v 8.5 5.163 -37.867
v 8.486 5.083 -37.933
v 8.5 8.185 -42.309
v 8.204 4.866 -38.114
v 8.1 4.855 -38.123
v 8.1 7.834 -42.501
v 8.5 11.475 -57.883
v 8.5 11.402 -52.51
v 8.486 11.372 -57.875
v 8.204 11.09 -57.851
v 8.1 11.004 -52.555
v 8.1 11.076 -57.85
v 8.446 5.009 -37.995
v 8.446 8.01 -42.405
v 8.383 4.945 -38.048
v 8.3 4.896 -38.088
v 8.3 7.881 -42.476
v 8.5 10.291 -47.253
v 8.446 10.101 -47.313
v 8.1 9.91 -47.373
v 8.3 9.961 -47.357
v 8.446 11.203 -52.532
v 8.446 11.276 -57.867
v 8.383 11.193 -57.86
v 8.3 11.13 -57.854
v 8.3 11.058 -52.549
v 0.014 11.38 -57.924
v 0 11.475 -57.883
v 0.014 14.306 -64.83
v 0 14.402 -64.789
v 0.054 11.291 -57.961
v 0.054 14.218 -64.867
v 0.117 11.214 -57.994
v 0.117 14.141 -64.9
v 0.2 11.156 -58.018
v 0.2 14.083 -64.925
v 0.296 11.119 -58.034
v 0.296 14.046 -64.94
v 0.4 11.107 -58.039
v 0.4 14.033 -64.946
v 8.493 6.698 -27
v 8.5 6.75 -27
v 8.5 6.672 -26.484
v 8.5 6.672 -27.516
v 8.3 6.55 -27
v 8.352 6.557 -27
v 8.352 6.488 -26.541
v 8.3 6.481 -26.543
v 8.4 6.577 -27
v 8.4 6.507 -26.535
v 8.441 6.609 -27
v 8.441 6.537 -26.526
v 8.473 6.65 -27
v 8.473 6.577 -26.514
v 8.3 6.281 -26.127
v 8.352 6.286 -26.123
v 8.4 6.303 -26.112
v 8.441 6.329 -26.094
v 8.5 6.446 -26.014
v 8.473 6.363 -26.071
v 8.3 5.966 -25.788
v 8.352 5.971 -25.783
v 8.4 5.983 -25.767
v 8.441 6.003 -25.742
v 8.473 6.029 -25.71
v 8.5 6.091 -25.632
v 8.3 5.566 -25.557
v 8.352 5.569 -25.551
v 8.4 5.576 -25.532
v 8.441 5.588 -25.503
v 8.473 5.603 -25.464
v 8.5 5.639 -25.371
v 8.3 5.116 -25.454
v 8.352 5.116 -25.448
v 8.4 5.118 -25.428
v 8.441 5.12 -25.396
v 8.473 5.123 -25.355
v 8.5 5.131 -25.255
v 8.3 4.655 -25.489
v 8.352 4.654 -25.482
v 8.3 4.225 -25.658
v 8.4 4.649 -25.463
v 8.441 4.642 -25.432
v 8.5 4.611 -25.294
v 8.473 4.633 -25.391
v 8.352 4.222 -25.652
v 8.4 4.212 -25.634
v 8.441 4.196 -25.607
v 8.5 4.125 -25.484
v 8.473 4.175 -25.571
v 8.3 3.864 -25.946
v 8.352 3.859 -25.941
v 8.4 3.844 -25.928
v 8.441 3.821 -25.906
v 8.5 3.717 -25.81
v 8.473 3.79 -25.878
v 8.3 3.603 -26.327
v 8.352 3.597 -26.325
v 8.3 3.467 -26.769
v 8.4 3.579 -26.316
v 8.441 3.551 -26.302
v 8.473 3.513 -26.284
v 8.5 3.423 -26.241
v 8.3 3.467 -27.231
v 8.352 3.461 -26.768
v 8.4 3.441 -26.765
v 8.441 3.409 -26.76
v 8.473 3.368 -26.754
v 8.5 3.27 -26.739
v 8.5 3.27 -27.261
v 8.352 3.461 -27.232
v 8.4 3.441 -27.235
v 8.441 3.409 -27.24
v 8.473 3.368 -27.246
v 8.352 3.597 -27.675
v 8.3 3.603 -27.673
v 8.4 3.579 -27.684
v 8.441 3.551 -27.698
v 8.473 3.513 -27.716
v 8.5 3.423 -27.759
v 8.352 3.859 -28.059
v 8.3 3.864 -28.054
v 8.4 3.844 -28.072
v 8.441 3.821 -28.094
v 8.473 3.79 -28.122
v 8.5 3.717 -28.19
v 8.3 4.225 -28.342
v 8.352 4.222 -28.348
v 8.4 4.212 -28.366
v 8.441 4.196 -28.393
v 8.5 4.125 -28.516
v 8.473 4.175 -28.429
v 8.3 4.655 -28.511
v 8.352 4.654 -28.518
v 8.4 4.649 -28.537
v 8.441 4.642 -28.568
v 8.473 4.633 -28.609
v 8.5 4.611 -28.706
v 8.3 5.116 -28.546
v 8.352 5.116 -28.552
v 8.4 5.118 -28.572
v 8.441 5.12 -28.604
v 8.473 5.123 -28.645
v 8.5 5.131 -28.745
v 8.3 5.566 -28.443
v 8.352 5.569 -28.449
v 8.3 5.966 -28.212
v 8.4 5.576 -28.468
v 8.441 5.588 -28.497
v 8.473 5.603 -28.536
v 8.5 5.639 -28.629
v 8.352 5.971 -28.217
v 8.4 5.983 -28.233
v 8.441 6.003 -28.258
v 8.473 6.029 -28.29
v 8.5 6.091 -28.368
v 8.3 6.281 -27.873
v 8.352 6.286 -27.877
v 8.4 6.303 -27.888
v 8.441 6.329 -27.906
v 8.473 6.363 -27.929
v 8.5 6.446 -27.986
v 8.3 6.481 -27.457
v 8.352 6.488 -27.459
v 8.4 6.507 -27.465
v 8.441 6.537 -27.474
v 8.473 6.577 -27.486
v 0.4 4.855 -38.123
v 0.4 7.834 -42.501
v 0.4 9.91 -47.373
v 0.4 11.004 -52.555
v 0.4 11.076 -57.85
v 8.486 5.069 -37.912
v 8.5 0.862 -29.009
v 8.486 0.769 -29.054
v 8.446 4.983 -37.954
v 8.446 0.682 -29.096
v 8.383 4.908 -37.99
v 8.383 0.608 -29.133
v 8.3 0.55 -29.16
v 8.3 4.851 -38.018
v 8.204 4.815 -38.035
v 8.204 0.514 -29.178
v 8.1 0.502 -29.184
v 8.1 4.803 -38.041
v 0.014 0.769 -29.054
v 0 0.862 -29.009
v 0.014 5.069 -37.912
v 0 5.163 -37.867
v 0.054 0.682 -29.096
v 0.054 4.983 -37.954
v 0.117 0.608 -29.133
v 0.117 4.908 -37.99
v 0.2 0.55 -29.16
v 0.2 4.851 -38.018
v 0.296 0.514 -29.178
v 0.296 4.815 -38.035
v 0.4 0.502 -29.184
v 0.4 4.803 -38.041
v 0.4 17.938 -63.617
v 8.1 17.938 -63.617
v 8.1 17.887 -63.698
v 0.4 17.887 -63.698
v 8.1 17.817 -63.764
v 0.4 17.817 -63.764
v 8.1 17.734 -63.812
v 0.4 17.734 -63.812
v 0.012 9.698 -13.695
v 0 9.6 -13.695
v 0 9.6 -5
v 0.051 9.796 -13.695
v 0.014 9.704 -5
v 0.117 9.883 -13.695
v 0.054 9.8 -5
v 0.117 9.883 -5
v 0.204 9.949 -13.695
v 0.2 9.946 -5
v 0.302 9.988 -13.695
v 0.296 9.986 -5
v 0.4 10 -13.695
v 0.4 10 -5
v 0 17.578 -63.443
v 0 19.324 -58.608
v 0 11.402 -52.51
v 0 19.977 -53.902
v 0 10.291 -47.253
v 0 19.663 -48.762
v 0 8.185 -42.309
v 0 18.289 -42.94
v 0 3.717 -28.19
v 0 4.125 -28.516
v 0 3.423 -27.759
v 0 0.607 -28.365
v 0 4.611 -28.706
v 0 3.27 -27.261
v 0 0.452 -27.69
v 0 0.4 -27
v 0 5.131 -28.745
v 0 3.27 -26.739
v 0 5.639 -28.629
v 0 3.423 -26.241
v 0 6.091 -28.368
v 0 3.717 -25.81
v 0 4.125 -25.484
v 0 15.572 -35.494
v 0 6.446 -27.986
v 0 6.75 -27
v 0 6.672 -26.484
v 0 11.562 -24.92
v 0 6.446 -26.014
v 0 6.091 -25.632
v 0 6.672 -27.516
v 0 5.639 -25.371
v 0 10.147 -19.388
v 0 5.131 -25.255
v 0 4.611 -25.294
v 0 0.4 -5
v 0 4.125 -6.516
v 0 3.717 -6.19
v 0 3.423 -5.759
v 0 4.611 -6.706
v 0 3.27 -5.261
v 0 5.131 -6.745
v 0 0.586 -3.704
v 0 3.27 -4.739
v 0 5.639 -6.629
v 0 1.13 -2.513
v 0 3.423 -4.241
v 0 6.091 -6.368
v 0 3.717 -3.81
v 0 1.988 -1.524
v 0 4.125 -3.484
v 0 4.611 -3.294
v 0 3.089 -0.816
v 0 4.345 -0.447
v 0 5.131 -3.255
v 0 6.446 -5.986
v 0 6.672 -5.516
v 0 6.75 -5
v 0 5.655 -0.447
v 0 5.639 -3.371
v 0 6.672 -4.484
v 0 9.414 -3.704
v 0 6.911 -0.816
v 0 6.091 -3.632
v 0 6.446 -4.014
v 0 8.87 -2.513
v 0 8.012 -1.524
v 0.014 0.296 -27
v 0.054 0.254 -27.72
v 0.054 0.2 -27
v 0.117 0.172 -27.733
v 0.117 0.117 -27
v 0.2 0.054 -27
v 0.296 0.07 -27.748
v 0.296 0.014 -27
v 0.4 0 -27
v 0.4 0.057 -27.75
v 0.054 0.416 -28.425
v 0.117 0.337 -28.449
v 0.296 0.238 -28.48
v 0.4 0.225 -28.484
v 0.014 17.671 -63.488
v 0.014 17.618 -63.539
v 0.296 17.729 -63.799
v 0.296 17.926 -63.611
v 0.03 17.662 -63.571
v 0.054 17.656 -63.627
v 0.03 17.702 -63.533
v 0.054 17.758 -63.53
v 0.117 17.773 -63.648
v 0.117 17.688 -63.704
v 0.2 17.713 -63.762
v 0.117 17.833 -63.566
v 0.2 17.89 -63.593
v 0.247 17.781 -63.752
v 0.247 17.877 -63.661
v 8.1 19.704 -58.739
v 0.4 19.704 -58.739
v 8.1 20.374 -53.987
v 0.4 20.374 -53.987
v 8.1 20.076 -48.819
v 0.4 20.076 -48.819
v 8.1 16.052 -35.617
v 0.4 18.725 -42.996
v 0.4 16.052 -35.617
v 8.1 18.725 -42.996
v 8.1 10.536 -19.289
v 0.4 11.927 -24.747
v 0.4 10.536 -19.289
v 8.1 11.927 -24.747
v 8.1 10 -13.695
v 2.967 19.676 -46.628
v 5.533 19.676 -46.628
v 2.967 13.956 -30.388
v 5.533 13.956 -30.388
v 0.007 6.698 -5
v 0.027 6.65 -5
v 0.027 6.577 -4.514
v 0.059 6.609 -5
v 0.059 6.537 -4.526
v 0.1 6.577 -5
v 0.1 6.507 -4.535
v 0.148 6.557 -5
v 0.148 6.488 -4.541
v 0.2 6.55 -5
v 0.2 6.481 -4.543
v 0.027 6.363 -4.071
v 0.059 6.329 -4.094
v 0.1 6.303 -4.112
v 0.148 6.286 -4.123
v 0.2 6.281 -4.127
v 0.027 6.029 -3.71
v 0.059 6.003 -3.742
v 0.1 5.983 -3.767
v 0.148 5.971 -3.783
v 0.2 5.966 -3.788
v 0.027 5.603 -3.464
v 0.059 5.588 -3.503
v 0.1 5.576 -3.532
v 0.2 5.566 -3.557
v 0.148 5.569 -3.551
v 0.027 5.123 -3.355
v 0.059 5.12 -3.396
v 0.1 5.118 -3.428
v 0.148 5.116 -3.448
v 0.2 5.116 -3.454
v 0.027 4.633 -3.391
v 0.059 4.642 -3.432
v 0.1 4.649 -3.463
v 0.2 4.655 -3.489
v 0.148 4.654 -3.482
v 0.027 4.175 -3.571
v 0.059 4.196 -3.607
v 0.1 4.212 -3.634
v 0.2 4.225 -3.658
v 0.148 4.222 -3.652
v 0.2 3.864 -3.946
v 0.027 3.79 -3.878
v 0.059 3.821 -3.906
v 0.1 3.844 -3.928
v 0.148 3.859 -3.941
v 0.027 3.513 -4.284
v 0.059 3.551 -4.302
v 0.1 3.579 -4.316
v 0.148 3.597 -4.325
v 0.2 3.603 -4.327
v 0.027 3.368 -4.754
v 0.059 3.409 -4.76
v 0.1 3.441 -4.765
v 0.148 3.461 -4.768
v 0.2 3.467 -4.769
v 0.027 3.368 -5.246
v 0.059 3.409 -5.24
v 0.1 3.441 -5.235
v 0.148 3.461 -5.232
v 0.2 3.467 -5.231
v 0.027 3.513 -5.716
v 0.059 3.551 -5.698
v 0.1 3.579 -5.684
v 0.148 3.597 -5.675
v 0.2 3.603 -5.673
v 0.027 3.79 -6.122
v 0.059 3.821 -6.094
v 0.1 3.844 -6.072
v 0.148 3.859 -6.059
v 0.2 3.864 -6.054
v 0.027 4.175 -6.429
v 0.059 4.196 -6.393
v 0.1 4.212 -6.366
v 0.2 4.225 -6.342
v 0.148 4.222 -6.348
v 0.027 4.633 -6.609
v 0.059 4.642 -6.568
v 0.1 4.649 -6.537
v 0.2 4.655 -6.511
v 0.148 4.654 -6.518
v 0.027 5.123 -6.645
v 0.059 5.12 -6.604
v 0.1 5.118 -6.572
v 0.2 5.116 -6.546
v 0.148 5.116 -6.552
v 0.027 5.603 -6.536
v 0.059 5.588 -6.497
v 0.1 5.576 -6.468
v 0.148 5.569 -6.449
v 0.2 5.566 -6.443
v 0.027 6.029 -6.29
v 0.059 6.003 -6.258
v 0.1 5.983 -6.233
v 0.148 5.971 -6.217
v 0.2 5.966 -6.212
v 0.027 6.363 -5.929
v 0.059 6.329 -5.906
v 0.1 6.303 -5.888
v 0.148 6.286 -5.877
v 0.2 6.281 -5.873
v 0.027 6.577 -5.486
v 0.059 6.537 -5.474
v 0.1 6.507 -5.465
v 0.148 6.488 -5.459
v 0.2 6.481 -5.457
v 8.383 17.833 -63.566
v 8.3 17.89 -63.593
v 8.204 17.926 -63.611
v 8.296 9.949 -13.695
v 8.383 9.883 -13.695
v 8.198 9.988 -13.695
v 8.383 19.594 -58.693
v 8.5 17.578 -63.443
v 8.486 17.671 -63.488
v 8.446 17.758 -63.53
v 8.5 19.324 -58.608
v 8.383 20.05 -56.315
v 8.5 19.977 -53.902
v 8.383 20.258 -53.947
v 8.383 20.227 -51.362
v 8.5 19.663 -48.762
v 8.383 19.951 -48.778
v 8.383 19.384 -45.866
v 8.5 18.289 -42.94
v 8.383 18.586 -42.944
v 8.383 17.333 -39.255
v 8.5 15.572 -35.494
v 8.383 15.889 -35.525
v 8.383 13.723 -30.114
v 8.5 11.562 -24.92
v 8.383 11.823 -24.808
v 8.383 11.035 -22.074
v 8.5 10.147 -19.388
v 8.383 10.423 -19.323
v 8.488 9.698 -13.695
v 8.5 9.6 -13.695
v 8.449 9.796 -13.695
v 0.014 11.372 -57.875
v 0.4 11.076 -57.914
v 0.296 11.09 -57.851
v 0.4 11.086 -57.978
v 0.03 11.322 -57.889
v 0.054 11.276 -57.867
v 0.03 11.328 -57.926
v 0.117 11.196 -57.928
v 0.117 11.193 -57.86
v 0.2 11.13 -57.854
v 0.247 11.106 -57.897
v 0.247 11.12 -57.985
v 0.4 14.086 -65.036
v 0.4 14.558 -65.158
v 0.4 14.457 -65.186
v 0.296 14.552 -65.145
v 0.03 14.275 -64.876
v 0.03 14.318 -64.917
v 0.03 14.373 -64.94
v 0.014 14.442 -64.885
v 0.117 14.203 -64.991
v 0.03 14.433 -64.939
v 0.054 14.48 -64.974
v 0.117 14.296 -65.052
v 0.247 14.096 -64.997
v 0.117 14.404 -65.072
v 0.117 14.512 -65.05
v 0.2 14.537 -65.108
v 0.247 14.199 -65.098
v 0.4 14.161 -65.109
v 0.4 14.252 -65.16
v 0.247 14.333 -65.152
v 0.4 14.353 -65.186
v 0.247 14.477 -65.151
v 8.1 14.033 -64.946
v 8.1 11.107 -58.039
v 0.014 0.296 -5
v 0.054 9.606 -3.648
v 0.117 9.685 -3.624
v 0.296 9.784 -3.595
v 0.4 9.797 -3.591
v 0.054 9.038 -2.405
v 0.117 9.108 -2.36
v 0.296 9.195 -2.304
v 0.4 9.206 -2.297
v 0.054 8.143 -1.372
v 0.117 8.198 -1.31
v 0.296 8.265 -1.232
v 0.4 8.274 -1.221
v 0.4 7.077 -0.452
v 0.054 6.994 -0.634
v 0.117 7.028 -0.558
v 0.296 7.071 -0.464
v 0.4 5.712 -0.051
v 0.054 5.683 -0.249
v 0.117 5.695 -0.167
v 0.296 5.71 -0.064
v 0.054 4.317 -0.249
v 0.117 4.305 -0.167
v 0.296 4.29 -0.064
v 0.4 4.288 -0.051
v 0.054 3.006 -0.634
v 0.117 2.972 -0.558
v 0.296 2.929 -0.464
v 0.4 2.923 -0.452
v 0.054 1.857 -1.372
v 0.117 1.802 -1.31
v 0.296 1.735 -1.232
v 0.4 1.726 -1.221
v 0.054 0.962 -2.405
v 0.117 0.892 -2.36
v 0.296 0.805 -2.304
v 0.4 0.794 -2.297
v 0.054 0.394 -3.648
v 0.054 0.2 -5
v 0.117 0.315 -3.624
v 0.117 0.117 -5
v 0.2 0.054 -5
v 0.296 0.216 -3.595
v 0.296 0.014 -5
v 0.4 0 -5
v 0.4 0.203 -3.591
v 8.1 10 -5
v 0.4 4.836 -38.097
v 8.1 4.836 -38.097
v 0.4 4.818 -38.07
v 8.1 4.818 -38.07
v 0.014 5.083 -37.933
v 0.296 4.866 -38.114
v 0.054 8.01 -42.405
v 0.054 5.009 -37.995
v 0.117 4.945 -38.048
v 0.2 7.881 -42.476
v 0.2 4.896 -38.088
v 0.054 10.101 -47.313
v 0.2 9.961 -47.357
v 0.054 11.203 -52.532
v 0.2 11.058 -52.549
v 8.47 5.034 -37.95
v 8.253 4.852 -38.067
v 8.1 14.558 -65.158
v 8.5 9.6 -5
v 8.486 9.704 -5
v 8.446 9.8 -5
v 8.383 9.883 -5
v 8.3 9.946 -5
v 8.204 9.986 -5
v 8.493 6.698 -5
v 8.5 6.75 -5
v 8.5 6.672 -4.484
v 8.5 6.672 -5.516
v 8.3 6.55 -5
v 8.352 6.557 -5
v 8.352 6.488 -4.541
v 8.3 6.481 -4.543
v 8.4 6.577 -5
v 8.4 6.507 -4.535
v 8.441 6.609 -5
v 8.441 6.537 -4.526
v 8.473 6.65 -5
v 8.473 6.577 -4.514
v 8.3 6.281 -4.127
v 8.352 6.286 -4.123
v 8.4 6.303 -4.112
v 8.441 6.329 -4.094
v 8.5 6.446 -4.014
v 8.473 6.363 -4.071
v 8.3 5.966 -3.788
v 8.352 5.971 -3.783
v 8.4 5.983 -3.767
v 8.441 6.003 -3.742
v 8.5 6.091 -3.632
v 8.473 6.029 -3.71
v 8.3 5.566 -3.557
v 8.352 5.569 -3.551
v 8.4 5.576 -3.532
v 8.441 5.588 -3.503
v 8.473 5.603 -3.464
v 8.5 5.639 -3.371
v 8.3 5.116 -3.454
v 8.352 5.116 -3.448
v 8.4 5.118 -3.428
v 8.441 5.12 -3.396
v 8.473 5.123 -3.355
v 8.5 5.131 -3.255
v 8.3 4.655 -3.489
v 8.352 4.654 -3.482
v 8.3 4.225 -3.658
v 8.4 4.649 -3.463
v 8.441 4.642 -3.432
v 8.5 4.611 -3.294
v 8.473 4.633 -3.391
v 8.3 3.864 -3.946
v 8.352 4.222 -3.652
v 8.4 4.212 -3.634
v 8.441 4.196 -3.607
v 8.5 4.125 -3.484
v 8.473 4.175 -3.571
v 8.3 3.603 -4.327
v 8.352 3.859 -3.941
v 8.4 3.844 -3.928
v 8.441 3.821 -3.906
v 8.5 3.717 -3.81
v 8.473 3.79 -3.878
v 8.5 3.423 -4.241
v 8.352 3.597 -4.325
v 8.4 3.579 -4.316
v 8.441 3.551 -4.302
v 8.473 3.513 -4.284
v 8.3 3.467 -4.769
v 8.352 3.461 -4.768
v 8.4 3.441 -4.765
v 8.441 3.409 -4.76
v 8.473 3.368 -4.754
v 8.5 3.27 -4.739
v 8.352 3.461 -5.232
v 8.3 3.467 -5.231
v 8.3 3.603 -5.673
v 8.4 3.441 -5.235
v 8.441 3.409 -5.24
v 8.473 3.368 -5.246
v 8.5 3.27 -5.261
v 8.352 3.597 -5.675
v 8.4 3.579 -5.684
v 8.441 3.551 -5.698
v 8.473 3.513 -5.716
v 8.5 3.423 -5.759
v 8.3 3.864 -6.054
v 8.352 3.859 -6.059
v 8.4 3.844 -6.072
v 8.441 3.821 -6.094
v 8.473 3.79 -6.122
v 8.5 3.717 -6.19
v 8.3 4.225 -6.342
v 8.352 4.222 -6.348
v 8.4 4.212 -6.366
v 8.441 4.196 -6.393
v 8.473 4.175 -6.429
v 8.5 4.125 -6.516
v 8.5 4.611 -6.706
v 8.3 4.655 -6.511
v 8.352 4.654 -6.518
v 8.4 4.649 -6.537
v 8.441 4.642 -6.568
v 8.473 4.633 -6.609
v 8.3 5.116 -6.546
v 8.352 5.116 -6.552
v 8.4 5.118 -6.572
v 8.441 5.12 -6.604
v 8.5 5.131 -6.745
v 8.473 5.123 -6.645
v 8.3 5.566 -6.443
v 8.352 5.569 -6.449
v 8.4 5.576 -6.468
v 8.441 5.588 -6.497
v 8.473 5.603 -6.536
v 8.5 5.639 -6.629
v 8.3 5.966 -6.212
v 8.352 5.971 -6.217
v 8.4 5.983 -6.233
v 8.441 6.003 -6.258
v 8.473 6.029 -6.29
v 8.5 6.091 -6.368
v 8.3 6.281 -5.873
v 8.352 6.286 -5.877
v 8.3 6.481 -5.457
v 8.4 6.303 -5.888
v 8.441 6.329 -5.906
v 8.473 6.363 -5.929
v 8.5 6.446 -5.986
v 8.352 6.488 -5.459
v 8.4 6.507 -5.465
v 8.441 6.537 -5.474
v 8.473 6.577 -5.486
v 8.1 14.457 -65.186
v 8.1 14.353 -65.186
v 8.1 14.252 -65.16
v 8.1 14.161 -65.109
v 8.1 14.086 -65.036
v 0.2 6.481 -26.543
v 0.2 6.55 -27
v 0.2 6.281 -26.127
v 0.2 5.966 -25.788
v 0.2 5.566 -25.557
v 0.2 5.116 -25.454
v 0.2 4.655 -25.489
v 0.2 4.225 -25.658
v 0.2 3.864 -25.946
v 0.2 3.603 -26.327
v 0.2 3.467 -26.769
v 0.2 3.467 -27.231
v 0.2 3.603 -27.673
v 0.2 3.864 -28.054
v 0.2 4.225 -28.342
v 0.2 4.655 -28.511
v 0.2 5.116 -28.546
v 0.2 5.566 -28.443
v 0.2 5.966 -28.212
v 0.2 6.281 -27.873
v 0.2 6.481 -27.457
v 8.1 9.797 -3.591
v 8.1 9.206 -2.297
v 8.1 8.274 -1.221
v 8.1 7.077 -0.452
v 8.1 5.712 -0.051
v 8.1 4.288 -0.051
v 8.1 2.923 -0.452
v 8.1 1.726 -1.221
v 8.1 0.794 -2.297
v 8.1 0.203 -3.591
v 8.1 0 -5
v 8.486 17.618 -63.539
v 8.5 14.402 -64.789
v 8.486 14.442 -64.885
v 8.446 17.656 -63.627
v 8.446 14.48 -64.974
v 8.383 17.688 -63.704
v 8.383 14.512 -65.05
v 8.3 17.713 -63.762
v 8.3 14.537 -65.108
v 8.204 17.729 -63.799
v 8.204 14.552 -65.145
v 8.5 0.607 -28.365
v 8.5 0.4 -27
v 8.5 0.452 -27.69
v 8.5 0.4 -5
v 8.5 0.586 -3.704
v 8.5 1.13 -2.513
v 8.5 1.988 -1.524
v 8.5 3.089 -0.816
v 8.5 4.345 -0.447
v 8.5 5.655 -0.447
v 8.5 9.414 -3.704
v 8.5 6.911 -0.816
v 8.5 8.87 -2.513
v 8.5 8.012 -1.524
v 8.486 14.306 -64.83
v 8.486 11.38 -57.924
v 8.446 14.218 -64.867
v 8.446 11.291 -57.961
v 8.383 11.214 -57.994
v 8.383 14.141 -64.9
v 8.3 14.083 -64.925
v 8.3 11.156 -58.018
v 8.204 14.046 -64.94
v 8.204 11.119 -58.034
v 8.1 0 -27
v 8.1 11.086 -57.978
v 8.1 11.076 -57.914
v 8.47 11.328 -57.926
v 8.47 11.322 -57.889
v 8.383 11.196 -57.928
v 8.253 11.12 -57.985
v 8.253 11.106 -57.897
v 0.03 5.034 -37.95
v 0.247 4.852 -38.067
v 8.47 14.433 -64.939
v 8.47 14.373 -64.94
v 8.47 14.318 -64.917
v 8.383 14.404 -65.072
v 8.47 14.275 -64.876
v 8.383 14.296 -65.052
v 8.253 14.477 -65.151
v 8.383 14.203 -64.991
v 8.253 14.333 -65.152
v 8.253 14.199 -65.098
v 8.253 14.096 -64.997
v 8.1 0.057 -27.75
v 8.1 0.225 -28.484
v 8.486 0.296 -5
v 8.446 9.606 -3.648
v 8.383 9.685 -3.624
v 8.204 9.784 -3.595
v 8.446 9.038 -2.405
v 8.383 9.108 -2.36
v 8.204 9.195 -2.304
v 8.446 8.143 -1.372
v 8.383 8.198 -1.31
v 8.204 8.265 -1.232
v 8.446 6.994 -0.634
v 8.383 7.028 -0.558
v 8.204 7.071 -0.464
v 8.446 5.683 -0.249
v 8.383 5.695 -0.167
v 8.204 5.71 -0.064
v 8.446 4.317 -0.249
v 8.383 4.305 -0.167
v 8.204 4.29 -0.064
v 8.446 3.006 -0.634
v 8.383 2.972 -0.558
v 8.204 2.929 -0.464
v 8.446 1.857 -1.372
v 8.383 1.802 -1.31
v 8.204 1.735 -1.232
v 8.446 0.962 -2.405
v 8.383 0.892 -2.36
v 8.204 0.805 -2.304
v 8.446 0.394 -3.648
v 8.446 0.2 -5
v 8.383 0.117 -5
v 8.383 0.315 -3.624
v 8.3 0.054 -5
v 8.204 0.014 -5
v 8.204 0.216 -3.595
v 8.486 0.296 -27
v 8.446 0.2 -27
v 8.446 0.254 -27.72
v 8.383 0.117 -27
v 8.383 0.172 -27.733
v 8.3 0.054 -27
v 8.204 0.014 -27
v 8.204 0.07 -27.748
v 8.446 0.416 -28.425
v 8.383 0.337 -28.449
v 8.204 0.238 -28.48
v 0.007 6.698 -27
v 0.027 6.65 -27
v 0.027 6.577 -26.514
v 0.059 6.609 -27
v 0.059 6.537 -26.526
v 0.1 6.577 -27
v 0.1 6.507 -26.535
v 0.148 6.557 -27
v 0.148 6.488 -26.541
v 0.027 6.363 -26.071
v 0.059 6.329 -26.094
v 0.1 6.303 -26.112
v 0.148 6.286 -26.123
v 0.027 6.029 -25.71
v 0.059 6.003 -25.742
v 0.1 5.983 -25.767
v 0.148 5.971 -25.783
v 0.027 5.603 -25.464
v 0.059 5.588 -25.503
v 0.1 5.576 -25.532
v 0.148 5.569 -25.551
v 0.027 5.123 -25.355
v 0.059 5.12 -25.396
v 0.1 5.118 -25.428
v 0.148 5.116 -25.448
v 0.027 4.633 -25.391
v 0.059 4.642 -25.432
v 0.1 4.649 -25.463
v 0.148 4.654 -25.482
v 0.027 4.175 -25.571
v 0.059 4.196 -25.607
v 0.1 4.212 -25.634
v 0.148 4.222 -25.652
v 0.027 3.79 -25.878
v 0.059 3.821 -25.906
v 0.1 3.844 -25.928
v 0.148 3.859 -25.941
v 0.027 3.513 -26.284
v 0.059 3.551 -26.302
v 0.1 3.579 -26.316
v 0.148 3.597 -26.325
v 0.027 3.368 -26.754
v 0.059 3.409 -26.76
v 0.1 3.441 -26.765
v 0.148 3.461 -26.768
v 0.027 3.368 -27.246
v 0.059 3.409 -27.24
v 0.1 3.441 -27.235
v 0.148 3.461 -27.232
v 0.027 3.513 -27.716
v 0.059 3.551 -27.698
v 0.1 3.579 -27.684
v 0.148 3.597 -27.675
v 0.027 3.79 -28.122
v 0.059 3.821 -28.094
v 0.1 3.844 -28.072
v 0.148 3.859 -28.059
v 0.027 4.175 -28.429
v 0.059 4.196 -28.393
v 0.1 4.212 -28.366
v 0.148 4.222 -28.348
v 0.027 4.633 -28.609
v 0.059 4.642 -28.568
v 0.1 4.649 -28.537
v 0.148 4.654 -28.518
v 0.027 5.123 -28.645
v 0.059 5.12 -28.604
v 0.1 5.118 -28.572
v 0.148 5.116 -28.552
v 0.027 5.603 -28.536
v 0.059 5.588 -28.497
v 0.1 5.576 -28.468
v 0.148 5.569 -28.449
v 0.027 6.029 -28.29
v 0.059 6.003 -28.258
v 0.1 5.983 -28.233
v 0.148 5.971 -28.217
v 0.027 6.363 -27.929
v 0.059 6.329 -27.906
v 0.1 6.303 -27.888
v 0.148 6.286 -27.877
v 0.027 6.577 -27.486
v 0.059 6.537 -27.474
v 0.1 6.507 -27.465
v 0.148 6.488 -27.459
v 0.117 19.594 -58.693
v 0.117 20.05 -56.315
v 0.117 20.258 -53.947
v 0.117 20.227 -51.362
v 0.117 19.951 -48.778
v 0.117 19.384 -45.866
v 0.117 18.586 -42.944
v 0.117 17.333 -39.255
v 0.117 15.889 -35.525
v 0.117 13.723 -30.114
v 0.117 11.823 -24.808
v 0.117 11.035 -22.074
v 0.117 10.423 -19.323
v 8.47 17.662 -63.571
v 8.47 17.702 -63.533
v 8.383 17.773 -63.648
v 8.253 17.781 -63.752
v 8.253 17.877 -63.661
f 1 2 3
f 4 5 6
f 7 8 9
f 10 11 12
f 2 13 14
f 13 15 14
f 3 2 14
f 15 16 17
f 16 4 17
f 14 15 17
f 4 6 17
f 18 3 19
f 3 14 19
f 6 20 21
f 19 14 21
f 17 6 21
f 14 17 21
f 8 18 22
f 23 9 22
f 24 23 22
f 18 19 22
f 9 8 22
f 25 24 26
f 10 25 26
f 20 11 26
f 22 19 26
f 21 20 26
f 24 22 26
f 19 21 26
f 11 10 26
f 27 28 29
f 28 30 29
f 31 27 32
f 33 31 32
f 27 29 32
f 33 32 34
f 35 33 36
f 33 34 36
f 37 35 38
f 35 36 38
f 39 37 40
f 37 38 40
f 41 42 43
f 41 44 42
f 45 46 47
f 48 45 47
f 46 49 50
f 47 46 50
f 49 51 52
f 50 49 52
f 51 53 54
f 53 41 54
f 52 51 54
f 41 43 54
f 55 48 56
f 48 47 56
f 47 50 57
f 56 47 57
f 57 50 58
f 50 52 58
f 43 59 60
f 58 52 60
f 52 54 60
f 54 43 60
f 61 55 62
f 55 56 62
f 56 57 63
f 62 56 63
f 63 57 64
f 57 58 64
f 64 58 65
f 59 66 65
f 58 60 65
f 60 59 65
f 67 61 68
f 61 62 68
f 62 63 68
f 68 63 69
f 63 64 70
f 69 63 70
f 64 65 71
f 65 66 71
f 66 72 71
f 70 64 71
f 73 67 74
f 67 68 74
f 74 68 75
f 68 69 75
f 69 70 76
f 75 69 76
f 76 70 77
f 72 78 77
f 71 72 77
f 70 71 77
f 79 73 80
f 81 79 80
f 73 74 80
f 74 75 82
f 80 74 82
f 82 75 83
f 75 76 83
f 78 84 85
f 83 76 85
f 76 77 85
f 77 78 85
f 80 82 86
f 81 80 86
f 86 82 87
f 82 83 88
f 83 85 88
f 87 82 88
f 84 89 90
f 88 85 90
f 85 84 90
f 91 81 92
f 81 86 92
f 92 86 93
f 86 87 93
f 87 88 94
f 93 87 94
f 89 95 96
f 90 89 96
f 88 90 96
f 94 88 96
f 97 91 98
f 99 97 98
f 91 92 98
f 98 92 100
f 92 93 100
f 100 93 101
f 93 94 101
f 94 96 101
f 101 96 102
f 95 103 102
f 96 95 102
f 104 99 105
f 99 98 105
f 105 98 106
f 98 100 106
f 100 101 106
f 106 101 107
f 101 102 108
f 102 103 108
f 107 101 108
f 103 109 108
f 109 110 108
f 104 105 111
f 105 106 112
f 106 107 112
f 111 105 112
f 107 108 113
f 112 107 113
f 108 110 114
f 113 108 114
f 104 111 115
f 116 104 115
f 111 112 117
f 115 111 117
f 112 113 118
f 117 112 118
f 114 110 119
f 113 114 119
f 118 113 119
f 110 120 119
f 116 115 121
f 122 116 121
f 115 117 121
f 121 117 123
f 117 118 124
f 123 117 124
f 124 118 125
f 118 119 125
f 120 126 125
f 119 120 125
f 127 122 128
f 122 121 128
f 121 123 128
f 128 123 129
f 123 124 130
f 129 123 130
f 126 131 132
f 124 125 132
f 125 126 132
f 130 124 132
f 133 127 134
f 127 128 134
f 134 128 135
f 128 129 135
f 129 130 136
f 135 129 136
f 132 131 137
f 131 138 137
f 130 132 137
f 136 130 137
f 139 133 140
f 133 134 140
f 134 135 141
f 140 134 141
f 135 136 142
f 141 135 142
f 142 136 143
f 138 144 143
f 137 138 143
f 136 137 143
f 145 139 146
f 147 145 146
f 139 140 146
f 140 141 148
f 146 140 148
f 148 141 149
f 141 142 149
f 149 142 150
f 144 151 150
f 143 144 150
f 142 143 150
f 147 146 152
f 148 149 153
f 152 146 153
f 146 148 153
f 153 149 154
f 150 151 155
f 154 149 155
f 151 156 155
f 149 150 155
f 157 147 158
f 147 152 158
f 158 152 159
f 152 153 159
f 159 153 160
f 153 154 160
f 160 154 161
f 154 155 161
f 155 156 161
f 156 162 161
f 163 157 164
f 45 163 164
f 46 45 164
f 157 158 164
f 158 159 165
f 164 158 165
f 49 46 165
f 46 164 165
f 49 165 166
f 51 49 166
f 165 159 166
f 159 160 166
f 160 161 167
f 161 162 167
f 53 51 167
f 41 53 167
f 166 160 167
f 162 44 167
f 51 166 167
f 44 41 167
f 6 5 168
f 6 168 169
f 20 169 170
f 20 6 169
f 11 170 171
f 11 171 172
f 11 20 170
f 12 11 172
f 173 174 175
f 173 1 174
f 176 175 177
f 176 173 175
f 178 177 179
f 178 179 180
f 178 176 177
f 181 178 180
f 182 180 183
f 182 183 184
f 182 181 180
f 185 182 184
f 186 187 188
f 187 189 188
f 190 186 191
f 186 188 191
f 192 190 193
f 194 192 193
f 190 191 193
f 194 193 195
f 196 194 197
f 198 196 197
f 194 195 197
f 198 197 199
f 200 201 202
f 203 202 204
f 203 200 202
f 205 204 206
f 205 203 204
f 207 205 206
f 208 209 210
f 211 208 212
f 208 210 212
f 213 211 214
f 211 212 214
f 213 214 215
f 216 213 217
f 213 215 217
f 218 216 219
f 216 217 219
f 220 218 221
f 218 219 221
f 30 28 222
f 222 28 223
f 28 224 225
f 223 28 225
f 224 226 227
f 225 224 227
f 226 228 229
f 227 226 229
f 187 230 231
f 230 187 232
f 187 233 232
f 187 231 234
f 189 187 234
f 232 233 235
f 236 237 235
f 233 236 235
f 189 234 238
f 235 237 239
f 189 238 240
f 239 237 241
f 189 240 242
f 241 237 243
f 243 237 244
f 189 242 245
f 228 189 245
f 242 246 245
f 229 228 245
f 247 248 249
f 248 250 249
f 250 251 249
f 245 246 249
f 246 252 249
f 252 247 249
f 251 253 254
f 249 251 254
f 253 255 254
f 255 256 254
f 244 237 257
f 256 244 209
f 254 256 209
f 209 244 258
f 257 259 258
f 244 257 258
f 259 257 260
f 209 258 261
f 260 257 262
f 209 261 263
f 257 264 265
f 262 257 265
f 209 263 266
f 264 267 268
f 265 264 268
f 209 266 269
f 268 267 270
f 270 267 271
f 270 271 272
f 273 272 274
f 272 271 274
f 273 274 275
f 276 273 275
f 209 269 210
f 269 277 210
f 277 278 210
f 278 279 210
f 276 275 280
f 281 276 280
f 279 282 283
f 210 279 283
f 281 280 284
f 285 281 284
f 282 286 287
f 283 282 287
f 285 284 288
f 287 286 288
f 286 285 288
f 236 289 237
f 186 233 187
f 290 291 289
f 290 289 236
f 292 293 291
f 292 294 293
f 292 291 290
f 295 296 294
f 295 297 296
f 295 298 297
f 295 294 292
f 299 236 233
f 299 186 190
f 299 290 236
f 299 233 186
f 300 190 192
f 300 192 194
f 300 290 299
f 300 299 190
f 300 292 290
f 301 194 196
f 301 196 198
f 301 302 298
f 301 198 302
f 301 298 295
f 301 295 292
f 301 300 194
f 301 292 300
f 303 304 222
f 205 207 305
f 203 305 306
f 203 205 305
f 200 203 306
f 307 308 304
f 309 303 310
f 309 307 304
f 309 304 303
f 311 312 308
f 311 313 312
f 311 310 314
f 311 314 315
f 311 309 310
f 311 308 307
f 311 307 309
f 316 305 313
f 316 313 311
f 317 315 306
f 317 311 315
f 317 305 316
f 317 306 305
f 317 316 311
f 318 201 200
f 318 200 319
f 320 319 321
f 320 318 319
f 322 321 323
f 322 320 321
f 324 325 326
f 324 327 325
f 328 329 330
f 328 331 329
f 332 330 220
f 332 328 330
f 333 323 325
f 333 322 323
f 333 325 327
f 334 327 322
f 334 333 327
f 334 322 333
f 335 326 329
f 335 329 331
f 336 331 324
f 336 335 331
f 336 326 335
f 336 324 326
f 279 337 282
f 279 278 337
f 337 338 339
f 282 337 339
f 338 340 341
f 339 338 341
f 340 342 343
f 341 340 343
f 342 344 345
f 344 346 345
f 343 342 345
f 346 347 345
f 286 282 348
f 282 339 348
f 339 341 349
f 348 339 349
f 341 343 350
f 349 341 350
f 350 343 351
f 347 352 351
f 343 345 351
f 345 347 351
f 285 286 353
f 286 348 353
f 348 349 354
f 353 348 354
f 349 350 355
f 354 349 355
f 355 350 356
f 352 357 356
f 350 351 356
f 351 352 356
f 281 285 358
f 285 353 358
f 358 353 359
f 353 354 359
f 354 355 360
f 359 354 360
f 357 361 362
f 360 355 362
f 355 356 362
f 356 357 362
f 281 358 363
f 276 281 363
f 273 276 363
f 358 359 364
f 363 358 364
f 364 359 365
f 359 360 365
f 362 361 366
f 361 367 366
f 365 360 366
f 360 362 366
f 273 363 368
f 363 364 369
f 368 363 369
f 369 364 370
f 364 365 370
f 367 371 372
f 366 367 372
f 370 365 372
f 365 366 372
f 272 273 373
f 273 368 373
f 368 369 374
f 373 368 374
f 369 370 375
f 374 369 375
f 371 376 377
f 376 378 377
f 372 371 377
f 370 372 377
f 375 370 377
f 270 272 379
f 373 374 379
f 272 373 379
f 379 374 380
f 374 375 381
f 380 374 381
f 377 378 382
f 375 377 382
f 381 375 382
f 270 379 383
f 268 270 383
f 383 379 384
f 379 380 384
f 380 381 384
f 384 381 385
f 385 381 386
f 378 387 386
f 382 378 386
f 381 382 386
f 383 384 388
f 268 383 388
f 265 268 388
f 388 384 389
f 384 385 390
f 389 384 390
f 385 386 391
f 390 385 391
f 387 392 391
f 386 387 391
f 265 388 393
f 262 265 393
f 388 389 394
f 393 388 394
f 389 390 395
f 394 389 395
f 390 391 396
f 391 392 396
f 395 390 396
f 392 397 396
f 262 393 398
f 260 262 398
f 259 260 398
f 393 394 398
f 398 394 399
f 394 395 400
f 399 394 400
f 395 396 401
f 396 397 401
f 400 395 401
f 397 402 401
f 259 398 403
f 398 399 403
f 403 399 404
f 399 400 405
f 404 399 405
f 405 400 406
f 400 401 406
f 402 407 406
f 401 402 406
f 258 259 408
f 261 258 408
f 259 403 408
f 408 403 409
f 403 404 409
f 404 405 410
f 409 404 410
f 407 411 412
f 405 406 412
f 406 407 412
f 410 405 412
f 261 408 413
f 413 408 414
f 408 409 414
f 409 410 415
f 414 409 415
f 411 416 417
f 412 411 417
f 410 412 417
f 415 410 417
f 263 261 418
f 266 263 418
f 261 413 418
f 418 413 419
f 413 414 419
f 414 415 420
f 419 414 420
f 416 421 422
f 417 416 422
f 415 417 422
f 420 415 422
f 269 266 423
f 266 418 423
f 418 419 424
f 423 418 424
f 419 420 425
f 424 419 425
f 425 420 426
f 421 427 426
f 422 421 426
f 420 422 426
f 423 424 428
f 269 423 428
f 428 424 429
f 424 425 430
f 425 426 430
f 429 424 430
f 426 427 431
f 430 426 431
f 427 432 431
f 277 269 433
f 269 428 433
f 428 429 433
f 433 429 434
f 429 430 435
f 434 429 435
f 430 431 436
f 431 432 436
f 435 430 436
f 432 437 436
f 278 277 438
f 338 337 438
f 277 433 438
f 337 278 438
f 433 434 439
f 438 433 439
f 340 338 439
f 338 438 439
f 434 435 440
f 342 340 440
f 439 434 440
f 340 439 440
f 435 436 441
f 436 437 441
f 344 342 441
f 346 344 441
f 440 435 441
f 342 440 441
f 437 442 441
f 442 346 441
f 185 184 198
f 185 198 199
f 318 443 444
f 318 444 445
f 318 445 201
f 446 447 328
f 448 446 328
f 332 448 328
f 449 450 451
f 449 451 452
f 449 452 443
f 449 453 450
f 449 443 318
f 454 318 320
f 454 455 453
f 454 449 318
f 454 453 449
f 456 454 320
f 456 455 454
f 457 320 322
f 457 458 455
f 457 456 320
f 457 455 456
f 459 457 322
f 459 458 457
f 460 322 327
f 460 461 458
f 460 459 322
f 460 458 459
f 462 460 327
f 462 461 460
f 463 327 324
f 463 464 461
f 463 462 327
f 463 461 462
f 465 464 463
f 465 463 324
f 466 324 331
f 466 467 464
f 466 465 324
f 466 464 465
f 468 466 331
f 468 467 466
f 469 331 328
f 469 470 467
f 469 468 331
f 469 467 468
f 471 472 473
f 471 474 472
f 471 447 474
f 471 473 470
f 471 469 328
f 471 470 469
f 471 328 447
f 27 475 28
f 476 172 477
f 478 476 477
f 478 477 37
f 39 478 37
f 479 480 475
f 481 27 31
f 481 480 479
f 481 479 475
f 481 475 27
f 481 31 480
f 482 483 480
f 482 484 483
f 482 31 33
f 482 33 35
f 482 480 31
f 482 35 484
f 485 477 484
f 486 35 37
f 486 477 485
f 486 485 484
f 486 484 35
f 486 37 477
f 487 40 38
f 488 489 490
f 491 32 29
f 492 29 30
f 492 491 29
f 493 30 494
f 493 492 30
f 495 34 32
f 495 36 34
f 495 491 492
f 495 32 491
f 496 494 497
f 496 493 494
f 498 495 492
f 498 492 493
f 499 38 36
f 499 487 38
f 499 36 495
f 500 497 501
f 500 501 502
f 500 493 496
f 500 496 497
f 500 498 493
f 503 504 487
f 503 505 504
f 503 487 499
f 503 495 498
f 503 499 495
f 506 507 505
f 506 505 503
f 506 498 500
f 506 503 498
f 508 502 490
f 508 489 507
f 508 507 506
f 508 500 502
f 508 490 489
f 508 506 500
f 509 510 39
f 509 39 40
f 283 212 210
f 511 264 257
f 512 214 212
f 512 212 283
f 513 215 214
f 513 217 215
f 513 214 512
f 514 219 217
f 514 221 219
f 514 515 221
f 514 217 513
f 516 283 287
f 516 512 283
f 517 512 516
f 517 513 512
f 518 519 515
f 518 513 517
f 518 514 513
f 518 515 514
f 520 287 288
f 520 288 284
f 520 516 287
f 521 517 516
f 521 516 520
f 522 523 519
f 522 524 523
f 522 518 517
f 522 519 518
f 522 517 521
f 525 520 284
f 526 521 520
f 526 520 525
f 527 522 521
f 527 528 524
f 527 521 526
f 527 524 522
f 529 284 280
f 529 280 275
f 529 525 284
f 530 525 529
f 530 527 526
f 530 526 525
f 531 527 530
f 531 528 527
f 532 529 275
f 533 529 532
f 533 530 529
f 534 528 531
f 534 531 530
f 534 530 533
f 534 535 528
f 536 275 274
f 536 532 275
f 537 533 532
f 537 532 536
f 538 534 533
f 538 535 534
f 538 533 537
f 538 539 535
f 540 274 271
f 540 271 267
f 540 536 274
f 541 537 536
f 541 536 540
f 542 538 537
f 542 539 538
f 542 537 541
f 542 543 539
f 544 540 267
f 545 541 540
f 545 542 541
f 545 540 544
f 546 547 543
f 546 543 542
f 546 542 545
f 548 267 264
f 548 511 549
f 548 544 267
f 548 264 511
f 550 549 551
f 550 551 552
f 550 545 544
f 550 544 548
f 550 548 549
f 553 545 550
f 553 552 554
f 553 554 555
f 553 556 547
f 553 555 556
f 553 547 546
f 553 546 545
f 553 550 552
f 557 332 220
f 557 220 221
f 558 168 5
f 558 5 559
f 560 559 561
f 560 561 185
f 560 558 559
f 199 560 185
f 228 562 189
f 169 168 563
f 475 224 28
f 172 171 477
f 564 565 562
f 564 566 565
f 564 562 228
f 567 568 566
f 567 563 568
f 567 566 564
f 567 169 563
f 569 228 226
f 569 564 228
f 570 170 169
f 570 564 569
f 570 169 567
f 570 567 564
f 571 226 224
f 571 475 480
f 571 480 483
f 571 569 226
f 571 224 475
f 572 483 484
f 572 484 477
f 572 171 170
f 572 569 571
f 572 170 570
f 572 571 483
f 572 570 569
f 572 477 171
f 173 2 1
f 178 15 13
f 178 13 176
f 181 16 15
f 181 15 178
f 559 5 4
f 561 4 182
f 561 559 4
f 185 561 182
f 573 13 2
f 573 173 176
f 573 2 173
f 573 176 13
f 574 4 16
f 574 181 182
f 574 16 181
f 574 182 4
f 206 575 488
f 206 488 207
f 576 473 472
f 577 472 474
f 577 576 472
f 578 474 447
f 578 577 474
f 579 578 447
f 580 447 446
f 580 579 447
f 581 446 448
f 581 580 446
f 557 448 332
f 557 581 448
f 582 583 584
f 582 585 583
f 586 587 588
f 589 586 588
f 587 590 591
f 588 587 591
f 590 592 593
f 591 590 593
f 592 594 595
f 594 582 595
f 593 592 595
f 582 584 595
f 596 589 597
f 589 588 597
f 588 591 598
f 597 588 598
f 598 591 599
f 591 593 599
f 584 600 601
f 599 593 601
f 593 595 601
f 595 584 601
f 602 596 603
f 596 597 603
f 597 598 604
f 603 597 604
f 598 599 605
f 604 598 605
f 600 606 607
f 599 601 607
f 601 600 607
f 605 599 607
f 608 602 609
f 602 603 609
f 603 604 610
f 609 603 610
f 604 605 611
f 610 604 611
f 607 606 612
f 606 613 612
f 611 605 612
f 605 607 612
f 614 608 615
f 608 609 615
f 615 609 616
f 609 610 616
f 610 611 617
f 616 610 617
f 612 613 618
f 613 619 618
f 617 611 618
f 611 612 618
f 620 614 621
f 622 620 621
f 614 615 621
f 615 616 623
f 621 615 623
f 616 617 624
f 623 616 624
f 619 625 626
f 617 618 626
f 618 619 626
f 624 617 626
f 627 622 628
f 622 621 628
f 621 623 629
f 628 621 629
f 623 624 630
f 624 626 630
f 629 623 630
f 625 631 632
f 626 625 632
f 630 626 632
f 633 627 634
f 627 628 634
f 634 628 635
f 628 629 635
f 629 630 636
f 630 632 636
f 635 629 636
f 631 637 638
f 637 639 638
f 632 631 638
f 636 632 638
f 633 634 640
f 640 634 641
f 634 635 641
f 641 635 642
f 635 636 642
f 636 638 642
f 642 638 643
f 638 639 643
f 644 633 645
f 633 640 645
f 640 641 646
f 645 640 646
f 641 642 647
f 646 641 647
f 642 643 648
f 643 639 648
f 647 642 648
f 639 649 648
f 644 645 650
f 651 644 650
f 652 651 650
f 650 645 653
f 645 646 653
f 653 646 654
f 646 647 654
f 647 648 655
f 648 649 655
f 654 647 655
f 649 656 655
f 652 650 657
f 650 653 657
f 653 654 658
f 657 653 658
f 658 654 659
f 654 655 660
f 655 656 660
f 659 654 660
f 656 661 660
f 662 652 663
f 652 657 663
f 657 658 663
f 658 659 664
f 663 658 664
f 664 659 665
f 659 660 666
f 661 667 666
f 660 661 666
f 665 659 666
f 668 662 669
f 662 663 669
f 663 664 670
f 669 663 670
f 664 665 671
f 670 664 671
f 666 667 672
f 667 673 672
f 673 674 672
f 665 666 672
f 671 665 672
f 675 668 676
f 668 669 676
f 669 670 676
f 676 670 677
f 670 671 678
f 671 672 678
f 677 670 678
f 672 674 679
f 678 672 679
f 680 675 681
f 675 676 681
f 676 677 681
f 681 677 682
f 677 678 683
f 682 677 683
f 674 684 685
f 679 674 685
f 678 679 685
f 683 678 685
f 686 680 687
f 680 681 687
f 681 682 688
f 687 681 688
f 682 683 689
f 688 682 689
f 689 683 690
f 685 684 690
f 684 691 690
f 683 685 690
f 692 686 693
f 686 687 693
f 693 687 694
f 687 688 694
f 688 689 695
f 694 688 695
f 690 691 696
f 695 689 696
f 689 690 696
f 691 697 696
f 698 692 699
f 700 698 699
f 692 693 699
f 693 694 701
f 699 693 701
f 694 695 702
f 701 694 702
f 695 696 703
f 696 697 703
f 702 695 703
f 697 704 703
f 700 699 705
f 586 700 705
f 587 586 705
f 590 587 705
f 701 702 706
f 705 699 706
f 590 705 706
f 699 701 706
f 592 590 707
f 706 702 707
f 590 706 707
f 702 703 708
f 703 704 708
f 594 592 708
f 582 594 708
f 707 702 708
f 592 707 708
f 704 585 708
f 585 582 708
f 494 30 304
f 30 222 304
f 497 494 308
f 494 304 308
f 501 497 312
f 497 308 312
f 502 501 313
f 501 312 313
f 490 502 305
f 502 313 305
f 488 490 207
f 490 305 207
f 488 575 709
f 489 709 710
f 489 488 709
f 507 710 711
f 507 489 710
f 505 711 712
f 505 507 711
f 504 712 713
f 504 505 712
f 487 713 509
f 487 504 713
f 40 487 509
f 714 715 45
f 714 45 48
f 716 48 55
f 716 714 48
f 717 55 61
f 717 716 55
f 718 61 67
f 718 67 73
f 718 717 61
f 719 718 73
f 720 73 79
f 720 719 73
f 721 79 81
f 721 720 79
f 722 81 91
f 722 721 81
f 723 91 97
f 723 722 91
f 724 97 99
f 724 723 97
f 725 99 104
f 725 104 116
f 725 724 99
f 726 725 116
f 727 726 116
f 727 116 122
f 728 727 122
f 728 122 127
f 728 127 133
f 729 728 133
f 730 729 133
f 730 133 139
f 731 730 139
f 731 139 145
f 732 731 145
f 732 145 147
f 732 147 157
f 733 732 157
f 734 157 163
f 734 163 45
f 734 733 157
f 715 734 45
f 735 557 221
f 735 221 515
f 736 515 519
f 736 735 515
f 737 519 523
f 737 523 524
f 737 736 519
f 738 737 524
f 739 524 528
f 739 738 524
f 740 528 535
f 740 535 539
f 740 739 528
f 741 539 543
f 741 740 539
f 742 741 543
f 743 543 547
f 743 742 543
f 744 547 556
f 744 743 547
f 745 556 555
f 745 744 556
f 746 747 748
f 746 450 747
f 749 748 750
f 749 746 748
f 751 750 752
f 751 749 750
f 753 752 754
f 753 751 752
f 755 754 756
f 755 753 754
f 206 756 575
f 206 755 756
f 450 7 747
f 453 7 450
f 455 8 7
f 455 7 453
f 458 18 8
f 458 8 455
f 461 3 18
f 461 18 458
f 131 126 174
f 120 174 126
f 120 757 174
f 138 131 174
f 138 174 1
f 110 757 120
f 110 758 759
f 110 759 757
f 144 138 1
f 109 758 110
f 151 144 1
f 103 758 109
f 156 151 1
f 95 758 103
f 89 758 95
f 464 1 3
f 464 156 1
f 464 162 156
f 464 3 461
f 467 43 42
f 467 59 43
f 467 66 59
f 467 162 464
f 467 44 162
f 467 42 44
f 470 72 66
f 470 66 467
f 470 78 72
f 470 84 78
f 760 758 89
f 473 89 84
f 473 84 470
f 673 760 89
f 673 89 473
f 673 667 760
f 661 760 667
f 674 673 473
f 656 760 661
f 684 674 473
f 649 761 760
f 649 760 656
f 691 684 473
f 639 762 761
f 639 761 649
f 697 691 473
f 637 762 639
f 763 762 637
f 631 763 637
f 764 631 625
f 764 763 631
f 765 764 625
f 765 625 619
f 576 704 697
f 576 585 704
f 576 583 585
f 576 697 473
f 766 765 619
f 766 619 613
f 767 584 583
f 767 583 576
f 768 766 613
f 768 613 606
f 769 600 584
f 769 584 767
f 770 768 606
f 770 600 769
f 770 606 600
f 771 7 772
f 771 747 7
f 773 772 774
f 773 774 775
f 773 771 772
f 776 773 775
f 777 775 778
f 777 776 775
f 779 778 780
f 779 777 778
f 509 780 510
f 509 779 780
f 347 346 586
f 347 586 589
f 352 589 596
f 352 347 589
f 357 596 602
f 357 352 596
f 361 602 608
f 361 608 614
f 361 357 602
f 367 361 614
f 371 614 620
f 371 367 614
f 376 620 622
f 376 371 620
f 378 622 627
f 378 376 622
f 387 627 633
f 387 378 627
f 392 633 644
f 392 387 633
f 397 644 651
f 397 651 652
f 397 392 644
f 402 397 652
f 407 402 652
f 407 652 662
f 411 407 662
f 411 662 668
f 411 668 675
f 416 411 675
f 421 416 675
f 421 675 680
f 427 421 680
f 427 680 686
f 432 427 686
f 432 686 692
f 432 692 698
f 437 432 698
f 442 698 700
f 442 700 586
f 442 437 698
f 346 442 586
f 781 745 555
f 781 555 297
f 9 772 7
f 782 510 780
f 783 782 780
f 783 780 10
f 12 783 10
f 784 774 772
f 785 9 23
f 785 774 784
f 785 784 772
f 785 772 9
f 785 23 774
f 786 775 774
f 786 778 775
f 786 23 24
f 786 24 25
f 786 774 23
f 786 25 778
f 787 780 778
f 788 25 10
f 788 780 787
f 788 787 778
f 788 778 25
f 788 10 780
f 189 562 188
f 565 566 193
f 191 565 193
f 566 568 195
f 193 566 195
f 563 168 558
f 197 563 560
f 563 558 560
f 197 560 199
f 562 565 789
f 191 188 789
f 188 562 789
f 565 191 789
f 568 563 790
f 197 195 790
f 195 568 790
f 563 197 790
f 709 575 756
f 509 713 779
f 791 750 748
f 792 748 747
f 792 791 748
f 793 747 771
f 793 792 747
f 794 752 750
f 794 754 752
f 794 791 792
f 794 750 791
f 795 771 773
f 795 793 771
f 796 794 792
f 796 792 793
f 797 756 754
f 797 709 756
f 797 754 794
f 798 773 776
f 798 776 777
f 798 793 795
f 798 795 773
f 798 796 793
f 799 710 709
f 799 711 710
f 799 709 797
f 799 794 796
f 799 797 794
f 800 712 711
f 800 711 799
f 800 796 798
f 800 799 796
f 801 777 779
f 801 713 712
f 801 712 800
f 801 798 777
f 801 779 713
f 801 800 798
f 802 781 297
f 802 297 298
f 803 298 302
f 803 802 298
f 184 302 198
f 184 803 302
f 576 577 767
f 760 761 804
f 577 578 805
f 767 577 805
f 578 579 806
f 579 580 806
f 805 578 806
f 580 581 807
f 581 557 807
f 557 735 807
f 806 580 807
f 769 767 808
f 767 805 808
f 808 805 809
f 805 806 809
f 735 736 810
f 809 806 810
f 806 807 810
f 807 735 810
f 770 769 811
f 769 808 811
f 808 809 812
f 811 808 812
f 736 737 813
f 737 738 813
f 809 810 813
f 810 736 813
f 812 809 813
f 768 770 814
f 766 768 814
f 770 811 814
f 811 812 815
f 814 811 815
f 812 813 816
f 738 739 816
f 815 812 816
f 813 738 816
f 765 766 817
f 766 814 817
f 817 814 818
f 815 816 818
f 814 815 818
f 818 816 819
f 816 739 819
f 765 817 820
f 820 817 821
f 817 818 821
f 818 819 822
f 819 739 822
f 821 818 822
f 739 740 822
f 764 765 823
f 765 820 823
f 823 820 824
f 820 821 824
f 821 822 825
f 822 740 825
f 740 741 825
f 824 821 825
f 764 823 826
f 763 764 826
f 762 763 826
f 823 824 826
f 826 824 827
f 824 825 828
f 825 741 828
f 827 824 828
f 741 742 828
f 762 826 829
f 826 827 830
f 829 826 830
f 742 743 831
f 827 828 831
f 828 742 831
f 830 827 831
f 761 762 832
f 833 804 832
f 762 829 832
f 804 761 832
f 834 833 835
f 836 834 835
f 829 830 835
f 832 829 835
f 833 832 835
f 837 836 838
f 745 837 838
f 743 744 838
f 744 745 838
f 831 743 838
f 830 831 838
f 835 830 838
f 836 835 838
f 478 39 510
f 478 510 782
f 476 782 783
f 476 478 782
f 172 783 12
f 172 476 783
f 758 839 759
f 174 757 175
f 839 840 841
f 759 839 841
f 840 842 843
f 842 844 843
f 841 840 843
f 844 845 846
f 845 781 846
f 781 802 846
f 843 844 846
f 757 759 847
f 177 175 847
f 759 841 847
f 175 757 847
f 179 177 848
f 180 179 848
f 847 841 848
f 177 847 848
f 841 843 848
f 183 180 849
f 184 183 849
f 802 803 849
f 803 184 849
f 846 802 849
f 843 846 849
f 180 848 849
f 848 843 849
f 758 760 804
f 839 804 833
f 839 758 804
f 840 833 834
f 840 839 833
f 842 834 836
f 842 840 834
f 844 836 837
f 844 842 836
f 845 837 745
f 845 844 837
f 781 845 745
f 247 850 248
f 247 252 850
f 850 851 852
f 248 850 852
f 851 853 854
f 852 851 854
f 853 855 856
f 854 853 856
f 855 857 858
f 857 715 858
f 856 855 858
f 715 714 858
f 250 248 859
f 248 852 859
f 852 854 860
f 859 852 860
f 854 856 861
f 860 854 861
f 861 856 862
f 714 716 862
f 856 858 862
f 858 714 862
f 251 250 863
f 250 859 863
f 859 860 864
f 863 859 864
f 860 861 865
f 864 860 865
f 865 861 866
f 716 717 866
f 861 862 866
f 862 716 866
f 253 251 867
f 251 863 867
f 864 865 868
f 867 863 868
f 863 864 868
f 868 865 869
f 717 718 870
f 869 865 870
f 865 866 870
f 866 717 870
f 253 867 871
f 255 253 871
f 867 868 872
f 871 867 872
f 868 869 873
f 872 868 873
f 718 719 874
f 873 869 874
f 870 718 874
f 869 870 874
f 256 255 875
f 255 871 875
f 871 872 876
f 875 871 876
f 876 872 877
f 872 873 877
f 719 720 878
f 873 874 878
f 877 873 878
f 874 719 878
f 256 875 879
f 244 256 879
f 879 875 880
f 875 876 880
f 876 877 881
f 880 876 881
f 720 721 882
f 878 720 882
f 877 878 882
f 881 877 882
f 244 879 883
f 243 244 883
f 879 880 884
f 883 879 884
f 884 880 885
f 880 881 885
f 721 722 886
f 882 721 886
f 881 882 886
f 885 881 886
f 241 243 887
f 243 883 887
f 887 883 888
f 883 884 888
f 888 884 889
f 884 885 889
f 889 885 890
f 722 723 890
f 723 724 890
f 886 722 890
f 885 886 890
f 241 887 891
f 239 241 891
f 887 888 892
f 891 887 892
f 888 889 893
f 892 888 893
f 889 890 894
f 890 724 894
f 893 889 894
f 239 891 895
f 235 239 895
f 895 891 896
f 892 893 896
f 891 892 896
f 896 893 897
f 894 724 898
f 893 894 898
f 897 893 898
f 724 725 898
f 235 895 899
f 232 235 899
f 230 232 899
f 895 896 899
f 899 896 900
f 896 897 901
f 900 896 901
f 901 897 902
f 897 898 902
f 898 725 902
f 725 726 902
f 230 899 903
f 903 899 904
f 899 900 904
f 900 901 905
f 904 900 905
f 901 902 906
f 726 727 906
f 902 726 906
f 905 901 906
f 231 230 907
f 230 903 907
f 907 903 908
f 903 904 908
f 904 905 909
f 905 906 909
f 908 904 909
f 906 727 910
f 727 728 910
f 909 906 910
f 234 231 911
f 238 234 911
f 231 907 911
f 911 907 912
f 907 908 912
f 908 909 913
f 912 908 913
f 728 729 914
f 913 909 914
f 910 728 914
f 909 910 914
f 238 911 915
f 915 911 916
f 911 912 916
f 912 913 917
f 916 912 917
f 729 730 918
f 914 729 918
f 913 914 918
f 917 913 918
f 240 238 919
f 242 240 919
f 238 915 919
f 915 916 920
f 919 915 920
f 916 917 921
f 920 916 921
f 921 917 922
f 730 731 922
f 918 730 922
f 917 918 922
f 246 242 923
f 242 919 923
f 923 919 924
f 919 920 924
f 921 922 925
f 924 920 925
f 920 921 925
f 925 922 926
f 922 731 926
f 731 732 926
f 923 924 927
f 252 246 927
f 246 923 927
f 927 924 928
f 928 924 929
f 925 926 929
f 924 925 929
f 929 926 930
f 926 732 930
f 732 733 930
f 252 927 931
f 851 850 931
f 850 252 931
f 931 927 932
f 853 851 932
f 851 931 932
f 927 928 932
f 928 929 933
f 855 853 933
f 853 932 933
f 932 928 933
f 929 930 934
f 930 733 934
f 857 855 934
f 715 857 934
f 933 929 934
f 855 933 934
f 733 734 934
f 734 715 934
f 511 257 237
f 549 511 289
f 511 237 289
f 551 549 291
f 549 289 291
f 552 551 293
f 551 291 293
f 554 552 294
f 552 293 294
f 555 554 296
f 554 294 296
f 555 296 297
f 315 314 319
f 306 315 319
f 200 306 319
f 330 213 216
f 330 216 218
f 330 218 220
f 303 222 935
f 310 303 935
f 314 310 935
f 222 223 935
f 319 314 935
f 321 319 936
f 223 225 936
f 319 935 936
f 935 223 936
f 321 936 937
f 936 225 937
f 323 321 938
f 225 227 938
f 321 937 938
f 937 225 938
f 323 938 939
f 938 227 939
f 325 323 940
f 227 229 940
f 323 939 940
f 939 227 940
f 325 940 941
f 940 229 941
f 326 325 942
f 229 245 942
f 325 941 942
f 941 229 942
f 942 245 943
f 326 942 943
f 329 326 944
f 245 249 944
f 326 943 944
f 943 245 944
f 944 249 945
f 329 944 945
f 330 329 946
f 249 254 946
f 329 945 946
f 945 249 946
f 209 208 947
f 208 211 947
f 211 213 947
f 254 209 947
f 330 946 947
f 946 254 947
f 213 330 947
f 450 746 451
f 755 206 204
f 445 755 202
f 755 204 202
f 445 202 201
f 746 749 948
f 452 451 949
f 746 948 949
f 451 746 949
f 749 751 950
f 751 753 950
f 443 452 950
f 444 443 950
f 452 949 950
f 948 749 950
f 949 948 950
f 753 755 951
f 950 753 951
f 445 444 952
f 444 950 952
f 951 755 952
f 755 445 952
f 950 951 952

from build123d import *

# Parameters (mm, degrees)
SKETCH_1_R            = 1.75
EXTRUDE_1_DEPTH       = 8.5
EXTRUDE_2_OUTLINE_R   = 1.75
EXTRUDE_2_OUTLINE_R_2 = 1.55
EXTRUDE_2_DEPTH       = 8.5
FILLET_1_R            = 0.4
FILLET_2_R            = 0.2


# Read off the part's stored shape, not the designer's step: 凸台-拉伸2
with BuildPart() as part:
    # 草图1 → 凸台-拉伸1 (new body)
    with BuildSketch(Plane(origin=(8.5, 0, 0), x_dir=(0, 0, -1), z_dir=(1, 0, 0))):
        with BuildLine():
            Line((13.694974759, 10), (5, 10))
            ThreePointArc((5, 10), (0, 5), (5, 0))
            Line((5, 0), (27, 0))
            ThreePointArc((27, 0), (28.120410255, 0.12714859), (29.183837075, 0.502127655))
            Line((29.183837075, 0.502127655), (38.08542066, 4.824084077))
            ThreePointArc((38.08542066, 4.824084077), (47.396990541, 9.917410338), (57.948000409, 11.067843667))
            Line((57.948000409, 11.067843667), (65.313809691, 14.189518476))
            Line((65.313809691, 14.189518476), (63.752972286, 17.872423117))
            add(Edge.make_bspline(
                [(63.752972286, 17.872423117), (45.928882678, 26.563787963), (31.059268621, 10), (13.694974759, 10)],
                knots=[0, 0, 0, 0, 1, 1, 1, 1], degree=3))
        make_face()
        with Locations(Location((5, 5, 0), (0, 0, 180))):
            Circle(SKETCH_1_R, mode=Mode.SUBTRACT)
        with Locations(Location((27, 5, 0), (0, 0, 180))):
            Circle(SKETCH_1_R, mode=Mode.SUBTRACT)
    extrude(amount=-EXTRUDE_1_DEPTH)

    # 凸台-拉伸2 outline → 凸台-拉伸2 (add)
    # profile 1 of 2: a face of its own
    with BuildSketch(Plane.YZ):
        with Locations((5, -5)):
            Circle(EXTRUDE_2_OUTLINE_R)
        with Locations((5, -5)):
            Circle(EXTRUDE_2_OUTLINE_R_2, mode=Mode.SUBTRACT)
    # profile 2 of 2: a face of its own
    with BuildSketch(Plane.YZ):
        with Locations((5, -27)):
            Circle(EXTRUDE_2_OUTLINE_R)
        with Locations((5, -27)):
            Circle(EXTRUDE_2_OUTLINE_R_2, mode=Mode.SUBTRACT)
    extrude(amount=EXTRUDE_2_DEPTH)

    # 圆角1
    fillet_1_edges = [part.edges().sort_by_distance(p)[0] for p in [
        (8.5, 9.917410338, -47.396990541),
        (8.5, 2.663105866, -33.634628868),
        (8.5, 0.12714859, -28.120410255),
        (8.5, 0, -16),
        (8.5, 5, 0),
        (8.5, 10, -9.347487379),
        (8.5, 17.192155422, -38.542735392),
        (0, 5, 0),
        (4.25, 17.872423117, -63.752972286),
        (4.25, 14.189518476, -65.313809691),
        (4.25, 11.067843667, -57.948000409),
        (4.25, 4.824084077, -38.08542066),
        (0, 0, -16),
        (0, 0.12714859, -28.120410255),
        (0, 2.663105866, -33.634628868),
        (0, 9.917410338, -47.396990541),
        (0, 12.628681071, -61.63090505),
        (0, 16.030970797, -64.533390989),
        (0, 17.192155422, -38.542735392),
        (0, 10, -9.347487379),
        (8.5, 16.030970797, -64.533390989),
        (8.5, 12.628681071, -61.63090505),
    ]]
    fillet(fillet_1_edges, radius=FILLET_1_R)

    # 圆角2
    fillet_2_edges = [part.edges().sort_by_distance(p)[0] for p in [
        (0, 3.45, -27),
        (8.5, 3.45, -27),
        (0, 3.45, -5),
        (8.5, 3.45, -5),
    ]]
    fillet(fillet_2_edges, radius=FILLET_2_R)


solid = part.part
